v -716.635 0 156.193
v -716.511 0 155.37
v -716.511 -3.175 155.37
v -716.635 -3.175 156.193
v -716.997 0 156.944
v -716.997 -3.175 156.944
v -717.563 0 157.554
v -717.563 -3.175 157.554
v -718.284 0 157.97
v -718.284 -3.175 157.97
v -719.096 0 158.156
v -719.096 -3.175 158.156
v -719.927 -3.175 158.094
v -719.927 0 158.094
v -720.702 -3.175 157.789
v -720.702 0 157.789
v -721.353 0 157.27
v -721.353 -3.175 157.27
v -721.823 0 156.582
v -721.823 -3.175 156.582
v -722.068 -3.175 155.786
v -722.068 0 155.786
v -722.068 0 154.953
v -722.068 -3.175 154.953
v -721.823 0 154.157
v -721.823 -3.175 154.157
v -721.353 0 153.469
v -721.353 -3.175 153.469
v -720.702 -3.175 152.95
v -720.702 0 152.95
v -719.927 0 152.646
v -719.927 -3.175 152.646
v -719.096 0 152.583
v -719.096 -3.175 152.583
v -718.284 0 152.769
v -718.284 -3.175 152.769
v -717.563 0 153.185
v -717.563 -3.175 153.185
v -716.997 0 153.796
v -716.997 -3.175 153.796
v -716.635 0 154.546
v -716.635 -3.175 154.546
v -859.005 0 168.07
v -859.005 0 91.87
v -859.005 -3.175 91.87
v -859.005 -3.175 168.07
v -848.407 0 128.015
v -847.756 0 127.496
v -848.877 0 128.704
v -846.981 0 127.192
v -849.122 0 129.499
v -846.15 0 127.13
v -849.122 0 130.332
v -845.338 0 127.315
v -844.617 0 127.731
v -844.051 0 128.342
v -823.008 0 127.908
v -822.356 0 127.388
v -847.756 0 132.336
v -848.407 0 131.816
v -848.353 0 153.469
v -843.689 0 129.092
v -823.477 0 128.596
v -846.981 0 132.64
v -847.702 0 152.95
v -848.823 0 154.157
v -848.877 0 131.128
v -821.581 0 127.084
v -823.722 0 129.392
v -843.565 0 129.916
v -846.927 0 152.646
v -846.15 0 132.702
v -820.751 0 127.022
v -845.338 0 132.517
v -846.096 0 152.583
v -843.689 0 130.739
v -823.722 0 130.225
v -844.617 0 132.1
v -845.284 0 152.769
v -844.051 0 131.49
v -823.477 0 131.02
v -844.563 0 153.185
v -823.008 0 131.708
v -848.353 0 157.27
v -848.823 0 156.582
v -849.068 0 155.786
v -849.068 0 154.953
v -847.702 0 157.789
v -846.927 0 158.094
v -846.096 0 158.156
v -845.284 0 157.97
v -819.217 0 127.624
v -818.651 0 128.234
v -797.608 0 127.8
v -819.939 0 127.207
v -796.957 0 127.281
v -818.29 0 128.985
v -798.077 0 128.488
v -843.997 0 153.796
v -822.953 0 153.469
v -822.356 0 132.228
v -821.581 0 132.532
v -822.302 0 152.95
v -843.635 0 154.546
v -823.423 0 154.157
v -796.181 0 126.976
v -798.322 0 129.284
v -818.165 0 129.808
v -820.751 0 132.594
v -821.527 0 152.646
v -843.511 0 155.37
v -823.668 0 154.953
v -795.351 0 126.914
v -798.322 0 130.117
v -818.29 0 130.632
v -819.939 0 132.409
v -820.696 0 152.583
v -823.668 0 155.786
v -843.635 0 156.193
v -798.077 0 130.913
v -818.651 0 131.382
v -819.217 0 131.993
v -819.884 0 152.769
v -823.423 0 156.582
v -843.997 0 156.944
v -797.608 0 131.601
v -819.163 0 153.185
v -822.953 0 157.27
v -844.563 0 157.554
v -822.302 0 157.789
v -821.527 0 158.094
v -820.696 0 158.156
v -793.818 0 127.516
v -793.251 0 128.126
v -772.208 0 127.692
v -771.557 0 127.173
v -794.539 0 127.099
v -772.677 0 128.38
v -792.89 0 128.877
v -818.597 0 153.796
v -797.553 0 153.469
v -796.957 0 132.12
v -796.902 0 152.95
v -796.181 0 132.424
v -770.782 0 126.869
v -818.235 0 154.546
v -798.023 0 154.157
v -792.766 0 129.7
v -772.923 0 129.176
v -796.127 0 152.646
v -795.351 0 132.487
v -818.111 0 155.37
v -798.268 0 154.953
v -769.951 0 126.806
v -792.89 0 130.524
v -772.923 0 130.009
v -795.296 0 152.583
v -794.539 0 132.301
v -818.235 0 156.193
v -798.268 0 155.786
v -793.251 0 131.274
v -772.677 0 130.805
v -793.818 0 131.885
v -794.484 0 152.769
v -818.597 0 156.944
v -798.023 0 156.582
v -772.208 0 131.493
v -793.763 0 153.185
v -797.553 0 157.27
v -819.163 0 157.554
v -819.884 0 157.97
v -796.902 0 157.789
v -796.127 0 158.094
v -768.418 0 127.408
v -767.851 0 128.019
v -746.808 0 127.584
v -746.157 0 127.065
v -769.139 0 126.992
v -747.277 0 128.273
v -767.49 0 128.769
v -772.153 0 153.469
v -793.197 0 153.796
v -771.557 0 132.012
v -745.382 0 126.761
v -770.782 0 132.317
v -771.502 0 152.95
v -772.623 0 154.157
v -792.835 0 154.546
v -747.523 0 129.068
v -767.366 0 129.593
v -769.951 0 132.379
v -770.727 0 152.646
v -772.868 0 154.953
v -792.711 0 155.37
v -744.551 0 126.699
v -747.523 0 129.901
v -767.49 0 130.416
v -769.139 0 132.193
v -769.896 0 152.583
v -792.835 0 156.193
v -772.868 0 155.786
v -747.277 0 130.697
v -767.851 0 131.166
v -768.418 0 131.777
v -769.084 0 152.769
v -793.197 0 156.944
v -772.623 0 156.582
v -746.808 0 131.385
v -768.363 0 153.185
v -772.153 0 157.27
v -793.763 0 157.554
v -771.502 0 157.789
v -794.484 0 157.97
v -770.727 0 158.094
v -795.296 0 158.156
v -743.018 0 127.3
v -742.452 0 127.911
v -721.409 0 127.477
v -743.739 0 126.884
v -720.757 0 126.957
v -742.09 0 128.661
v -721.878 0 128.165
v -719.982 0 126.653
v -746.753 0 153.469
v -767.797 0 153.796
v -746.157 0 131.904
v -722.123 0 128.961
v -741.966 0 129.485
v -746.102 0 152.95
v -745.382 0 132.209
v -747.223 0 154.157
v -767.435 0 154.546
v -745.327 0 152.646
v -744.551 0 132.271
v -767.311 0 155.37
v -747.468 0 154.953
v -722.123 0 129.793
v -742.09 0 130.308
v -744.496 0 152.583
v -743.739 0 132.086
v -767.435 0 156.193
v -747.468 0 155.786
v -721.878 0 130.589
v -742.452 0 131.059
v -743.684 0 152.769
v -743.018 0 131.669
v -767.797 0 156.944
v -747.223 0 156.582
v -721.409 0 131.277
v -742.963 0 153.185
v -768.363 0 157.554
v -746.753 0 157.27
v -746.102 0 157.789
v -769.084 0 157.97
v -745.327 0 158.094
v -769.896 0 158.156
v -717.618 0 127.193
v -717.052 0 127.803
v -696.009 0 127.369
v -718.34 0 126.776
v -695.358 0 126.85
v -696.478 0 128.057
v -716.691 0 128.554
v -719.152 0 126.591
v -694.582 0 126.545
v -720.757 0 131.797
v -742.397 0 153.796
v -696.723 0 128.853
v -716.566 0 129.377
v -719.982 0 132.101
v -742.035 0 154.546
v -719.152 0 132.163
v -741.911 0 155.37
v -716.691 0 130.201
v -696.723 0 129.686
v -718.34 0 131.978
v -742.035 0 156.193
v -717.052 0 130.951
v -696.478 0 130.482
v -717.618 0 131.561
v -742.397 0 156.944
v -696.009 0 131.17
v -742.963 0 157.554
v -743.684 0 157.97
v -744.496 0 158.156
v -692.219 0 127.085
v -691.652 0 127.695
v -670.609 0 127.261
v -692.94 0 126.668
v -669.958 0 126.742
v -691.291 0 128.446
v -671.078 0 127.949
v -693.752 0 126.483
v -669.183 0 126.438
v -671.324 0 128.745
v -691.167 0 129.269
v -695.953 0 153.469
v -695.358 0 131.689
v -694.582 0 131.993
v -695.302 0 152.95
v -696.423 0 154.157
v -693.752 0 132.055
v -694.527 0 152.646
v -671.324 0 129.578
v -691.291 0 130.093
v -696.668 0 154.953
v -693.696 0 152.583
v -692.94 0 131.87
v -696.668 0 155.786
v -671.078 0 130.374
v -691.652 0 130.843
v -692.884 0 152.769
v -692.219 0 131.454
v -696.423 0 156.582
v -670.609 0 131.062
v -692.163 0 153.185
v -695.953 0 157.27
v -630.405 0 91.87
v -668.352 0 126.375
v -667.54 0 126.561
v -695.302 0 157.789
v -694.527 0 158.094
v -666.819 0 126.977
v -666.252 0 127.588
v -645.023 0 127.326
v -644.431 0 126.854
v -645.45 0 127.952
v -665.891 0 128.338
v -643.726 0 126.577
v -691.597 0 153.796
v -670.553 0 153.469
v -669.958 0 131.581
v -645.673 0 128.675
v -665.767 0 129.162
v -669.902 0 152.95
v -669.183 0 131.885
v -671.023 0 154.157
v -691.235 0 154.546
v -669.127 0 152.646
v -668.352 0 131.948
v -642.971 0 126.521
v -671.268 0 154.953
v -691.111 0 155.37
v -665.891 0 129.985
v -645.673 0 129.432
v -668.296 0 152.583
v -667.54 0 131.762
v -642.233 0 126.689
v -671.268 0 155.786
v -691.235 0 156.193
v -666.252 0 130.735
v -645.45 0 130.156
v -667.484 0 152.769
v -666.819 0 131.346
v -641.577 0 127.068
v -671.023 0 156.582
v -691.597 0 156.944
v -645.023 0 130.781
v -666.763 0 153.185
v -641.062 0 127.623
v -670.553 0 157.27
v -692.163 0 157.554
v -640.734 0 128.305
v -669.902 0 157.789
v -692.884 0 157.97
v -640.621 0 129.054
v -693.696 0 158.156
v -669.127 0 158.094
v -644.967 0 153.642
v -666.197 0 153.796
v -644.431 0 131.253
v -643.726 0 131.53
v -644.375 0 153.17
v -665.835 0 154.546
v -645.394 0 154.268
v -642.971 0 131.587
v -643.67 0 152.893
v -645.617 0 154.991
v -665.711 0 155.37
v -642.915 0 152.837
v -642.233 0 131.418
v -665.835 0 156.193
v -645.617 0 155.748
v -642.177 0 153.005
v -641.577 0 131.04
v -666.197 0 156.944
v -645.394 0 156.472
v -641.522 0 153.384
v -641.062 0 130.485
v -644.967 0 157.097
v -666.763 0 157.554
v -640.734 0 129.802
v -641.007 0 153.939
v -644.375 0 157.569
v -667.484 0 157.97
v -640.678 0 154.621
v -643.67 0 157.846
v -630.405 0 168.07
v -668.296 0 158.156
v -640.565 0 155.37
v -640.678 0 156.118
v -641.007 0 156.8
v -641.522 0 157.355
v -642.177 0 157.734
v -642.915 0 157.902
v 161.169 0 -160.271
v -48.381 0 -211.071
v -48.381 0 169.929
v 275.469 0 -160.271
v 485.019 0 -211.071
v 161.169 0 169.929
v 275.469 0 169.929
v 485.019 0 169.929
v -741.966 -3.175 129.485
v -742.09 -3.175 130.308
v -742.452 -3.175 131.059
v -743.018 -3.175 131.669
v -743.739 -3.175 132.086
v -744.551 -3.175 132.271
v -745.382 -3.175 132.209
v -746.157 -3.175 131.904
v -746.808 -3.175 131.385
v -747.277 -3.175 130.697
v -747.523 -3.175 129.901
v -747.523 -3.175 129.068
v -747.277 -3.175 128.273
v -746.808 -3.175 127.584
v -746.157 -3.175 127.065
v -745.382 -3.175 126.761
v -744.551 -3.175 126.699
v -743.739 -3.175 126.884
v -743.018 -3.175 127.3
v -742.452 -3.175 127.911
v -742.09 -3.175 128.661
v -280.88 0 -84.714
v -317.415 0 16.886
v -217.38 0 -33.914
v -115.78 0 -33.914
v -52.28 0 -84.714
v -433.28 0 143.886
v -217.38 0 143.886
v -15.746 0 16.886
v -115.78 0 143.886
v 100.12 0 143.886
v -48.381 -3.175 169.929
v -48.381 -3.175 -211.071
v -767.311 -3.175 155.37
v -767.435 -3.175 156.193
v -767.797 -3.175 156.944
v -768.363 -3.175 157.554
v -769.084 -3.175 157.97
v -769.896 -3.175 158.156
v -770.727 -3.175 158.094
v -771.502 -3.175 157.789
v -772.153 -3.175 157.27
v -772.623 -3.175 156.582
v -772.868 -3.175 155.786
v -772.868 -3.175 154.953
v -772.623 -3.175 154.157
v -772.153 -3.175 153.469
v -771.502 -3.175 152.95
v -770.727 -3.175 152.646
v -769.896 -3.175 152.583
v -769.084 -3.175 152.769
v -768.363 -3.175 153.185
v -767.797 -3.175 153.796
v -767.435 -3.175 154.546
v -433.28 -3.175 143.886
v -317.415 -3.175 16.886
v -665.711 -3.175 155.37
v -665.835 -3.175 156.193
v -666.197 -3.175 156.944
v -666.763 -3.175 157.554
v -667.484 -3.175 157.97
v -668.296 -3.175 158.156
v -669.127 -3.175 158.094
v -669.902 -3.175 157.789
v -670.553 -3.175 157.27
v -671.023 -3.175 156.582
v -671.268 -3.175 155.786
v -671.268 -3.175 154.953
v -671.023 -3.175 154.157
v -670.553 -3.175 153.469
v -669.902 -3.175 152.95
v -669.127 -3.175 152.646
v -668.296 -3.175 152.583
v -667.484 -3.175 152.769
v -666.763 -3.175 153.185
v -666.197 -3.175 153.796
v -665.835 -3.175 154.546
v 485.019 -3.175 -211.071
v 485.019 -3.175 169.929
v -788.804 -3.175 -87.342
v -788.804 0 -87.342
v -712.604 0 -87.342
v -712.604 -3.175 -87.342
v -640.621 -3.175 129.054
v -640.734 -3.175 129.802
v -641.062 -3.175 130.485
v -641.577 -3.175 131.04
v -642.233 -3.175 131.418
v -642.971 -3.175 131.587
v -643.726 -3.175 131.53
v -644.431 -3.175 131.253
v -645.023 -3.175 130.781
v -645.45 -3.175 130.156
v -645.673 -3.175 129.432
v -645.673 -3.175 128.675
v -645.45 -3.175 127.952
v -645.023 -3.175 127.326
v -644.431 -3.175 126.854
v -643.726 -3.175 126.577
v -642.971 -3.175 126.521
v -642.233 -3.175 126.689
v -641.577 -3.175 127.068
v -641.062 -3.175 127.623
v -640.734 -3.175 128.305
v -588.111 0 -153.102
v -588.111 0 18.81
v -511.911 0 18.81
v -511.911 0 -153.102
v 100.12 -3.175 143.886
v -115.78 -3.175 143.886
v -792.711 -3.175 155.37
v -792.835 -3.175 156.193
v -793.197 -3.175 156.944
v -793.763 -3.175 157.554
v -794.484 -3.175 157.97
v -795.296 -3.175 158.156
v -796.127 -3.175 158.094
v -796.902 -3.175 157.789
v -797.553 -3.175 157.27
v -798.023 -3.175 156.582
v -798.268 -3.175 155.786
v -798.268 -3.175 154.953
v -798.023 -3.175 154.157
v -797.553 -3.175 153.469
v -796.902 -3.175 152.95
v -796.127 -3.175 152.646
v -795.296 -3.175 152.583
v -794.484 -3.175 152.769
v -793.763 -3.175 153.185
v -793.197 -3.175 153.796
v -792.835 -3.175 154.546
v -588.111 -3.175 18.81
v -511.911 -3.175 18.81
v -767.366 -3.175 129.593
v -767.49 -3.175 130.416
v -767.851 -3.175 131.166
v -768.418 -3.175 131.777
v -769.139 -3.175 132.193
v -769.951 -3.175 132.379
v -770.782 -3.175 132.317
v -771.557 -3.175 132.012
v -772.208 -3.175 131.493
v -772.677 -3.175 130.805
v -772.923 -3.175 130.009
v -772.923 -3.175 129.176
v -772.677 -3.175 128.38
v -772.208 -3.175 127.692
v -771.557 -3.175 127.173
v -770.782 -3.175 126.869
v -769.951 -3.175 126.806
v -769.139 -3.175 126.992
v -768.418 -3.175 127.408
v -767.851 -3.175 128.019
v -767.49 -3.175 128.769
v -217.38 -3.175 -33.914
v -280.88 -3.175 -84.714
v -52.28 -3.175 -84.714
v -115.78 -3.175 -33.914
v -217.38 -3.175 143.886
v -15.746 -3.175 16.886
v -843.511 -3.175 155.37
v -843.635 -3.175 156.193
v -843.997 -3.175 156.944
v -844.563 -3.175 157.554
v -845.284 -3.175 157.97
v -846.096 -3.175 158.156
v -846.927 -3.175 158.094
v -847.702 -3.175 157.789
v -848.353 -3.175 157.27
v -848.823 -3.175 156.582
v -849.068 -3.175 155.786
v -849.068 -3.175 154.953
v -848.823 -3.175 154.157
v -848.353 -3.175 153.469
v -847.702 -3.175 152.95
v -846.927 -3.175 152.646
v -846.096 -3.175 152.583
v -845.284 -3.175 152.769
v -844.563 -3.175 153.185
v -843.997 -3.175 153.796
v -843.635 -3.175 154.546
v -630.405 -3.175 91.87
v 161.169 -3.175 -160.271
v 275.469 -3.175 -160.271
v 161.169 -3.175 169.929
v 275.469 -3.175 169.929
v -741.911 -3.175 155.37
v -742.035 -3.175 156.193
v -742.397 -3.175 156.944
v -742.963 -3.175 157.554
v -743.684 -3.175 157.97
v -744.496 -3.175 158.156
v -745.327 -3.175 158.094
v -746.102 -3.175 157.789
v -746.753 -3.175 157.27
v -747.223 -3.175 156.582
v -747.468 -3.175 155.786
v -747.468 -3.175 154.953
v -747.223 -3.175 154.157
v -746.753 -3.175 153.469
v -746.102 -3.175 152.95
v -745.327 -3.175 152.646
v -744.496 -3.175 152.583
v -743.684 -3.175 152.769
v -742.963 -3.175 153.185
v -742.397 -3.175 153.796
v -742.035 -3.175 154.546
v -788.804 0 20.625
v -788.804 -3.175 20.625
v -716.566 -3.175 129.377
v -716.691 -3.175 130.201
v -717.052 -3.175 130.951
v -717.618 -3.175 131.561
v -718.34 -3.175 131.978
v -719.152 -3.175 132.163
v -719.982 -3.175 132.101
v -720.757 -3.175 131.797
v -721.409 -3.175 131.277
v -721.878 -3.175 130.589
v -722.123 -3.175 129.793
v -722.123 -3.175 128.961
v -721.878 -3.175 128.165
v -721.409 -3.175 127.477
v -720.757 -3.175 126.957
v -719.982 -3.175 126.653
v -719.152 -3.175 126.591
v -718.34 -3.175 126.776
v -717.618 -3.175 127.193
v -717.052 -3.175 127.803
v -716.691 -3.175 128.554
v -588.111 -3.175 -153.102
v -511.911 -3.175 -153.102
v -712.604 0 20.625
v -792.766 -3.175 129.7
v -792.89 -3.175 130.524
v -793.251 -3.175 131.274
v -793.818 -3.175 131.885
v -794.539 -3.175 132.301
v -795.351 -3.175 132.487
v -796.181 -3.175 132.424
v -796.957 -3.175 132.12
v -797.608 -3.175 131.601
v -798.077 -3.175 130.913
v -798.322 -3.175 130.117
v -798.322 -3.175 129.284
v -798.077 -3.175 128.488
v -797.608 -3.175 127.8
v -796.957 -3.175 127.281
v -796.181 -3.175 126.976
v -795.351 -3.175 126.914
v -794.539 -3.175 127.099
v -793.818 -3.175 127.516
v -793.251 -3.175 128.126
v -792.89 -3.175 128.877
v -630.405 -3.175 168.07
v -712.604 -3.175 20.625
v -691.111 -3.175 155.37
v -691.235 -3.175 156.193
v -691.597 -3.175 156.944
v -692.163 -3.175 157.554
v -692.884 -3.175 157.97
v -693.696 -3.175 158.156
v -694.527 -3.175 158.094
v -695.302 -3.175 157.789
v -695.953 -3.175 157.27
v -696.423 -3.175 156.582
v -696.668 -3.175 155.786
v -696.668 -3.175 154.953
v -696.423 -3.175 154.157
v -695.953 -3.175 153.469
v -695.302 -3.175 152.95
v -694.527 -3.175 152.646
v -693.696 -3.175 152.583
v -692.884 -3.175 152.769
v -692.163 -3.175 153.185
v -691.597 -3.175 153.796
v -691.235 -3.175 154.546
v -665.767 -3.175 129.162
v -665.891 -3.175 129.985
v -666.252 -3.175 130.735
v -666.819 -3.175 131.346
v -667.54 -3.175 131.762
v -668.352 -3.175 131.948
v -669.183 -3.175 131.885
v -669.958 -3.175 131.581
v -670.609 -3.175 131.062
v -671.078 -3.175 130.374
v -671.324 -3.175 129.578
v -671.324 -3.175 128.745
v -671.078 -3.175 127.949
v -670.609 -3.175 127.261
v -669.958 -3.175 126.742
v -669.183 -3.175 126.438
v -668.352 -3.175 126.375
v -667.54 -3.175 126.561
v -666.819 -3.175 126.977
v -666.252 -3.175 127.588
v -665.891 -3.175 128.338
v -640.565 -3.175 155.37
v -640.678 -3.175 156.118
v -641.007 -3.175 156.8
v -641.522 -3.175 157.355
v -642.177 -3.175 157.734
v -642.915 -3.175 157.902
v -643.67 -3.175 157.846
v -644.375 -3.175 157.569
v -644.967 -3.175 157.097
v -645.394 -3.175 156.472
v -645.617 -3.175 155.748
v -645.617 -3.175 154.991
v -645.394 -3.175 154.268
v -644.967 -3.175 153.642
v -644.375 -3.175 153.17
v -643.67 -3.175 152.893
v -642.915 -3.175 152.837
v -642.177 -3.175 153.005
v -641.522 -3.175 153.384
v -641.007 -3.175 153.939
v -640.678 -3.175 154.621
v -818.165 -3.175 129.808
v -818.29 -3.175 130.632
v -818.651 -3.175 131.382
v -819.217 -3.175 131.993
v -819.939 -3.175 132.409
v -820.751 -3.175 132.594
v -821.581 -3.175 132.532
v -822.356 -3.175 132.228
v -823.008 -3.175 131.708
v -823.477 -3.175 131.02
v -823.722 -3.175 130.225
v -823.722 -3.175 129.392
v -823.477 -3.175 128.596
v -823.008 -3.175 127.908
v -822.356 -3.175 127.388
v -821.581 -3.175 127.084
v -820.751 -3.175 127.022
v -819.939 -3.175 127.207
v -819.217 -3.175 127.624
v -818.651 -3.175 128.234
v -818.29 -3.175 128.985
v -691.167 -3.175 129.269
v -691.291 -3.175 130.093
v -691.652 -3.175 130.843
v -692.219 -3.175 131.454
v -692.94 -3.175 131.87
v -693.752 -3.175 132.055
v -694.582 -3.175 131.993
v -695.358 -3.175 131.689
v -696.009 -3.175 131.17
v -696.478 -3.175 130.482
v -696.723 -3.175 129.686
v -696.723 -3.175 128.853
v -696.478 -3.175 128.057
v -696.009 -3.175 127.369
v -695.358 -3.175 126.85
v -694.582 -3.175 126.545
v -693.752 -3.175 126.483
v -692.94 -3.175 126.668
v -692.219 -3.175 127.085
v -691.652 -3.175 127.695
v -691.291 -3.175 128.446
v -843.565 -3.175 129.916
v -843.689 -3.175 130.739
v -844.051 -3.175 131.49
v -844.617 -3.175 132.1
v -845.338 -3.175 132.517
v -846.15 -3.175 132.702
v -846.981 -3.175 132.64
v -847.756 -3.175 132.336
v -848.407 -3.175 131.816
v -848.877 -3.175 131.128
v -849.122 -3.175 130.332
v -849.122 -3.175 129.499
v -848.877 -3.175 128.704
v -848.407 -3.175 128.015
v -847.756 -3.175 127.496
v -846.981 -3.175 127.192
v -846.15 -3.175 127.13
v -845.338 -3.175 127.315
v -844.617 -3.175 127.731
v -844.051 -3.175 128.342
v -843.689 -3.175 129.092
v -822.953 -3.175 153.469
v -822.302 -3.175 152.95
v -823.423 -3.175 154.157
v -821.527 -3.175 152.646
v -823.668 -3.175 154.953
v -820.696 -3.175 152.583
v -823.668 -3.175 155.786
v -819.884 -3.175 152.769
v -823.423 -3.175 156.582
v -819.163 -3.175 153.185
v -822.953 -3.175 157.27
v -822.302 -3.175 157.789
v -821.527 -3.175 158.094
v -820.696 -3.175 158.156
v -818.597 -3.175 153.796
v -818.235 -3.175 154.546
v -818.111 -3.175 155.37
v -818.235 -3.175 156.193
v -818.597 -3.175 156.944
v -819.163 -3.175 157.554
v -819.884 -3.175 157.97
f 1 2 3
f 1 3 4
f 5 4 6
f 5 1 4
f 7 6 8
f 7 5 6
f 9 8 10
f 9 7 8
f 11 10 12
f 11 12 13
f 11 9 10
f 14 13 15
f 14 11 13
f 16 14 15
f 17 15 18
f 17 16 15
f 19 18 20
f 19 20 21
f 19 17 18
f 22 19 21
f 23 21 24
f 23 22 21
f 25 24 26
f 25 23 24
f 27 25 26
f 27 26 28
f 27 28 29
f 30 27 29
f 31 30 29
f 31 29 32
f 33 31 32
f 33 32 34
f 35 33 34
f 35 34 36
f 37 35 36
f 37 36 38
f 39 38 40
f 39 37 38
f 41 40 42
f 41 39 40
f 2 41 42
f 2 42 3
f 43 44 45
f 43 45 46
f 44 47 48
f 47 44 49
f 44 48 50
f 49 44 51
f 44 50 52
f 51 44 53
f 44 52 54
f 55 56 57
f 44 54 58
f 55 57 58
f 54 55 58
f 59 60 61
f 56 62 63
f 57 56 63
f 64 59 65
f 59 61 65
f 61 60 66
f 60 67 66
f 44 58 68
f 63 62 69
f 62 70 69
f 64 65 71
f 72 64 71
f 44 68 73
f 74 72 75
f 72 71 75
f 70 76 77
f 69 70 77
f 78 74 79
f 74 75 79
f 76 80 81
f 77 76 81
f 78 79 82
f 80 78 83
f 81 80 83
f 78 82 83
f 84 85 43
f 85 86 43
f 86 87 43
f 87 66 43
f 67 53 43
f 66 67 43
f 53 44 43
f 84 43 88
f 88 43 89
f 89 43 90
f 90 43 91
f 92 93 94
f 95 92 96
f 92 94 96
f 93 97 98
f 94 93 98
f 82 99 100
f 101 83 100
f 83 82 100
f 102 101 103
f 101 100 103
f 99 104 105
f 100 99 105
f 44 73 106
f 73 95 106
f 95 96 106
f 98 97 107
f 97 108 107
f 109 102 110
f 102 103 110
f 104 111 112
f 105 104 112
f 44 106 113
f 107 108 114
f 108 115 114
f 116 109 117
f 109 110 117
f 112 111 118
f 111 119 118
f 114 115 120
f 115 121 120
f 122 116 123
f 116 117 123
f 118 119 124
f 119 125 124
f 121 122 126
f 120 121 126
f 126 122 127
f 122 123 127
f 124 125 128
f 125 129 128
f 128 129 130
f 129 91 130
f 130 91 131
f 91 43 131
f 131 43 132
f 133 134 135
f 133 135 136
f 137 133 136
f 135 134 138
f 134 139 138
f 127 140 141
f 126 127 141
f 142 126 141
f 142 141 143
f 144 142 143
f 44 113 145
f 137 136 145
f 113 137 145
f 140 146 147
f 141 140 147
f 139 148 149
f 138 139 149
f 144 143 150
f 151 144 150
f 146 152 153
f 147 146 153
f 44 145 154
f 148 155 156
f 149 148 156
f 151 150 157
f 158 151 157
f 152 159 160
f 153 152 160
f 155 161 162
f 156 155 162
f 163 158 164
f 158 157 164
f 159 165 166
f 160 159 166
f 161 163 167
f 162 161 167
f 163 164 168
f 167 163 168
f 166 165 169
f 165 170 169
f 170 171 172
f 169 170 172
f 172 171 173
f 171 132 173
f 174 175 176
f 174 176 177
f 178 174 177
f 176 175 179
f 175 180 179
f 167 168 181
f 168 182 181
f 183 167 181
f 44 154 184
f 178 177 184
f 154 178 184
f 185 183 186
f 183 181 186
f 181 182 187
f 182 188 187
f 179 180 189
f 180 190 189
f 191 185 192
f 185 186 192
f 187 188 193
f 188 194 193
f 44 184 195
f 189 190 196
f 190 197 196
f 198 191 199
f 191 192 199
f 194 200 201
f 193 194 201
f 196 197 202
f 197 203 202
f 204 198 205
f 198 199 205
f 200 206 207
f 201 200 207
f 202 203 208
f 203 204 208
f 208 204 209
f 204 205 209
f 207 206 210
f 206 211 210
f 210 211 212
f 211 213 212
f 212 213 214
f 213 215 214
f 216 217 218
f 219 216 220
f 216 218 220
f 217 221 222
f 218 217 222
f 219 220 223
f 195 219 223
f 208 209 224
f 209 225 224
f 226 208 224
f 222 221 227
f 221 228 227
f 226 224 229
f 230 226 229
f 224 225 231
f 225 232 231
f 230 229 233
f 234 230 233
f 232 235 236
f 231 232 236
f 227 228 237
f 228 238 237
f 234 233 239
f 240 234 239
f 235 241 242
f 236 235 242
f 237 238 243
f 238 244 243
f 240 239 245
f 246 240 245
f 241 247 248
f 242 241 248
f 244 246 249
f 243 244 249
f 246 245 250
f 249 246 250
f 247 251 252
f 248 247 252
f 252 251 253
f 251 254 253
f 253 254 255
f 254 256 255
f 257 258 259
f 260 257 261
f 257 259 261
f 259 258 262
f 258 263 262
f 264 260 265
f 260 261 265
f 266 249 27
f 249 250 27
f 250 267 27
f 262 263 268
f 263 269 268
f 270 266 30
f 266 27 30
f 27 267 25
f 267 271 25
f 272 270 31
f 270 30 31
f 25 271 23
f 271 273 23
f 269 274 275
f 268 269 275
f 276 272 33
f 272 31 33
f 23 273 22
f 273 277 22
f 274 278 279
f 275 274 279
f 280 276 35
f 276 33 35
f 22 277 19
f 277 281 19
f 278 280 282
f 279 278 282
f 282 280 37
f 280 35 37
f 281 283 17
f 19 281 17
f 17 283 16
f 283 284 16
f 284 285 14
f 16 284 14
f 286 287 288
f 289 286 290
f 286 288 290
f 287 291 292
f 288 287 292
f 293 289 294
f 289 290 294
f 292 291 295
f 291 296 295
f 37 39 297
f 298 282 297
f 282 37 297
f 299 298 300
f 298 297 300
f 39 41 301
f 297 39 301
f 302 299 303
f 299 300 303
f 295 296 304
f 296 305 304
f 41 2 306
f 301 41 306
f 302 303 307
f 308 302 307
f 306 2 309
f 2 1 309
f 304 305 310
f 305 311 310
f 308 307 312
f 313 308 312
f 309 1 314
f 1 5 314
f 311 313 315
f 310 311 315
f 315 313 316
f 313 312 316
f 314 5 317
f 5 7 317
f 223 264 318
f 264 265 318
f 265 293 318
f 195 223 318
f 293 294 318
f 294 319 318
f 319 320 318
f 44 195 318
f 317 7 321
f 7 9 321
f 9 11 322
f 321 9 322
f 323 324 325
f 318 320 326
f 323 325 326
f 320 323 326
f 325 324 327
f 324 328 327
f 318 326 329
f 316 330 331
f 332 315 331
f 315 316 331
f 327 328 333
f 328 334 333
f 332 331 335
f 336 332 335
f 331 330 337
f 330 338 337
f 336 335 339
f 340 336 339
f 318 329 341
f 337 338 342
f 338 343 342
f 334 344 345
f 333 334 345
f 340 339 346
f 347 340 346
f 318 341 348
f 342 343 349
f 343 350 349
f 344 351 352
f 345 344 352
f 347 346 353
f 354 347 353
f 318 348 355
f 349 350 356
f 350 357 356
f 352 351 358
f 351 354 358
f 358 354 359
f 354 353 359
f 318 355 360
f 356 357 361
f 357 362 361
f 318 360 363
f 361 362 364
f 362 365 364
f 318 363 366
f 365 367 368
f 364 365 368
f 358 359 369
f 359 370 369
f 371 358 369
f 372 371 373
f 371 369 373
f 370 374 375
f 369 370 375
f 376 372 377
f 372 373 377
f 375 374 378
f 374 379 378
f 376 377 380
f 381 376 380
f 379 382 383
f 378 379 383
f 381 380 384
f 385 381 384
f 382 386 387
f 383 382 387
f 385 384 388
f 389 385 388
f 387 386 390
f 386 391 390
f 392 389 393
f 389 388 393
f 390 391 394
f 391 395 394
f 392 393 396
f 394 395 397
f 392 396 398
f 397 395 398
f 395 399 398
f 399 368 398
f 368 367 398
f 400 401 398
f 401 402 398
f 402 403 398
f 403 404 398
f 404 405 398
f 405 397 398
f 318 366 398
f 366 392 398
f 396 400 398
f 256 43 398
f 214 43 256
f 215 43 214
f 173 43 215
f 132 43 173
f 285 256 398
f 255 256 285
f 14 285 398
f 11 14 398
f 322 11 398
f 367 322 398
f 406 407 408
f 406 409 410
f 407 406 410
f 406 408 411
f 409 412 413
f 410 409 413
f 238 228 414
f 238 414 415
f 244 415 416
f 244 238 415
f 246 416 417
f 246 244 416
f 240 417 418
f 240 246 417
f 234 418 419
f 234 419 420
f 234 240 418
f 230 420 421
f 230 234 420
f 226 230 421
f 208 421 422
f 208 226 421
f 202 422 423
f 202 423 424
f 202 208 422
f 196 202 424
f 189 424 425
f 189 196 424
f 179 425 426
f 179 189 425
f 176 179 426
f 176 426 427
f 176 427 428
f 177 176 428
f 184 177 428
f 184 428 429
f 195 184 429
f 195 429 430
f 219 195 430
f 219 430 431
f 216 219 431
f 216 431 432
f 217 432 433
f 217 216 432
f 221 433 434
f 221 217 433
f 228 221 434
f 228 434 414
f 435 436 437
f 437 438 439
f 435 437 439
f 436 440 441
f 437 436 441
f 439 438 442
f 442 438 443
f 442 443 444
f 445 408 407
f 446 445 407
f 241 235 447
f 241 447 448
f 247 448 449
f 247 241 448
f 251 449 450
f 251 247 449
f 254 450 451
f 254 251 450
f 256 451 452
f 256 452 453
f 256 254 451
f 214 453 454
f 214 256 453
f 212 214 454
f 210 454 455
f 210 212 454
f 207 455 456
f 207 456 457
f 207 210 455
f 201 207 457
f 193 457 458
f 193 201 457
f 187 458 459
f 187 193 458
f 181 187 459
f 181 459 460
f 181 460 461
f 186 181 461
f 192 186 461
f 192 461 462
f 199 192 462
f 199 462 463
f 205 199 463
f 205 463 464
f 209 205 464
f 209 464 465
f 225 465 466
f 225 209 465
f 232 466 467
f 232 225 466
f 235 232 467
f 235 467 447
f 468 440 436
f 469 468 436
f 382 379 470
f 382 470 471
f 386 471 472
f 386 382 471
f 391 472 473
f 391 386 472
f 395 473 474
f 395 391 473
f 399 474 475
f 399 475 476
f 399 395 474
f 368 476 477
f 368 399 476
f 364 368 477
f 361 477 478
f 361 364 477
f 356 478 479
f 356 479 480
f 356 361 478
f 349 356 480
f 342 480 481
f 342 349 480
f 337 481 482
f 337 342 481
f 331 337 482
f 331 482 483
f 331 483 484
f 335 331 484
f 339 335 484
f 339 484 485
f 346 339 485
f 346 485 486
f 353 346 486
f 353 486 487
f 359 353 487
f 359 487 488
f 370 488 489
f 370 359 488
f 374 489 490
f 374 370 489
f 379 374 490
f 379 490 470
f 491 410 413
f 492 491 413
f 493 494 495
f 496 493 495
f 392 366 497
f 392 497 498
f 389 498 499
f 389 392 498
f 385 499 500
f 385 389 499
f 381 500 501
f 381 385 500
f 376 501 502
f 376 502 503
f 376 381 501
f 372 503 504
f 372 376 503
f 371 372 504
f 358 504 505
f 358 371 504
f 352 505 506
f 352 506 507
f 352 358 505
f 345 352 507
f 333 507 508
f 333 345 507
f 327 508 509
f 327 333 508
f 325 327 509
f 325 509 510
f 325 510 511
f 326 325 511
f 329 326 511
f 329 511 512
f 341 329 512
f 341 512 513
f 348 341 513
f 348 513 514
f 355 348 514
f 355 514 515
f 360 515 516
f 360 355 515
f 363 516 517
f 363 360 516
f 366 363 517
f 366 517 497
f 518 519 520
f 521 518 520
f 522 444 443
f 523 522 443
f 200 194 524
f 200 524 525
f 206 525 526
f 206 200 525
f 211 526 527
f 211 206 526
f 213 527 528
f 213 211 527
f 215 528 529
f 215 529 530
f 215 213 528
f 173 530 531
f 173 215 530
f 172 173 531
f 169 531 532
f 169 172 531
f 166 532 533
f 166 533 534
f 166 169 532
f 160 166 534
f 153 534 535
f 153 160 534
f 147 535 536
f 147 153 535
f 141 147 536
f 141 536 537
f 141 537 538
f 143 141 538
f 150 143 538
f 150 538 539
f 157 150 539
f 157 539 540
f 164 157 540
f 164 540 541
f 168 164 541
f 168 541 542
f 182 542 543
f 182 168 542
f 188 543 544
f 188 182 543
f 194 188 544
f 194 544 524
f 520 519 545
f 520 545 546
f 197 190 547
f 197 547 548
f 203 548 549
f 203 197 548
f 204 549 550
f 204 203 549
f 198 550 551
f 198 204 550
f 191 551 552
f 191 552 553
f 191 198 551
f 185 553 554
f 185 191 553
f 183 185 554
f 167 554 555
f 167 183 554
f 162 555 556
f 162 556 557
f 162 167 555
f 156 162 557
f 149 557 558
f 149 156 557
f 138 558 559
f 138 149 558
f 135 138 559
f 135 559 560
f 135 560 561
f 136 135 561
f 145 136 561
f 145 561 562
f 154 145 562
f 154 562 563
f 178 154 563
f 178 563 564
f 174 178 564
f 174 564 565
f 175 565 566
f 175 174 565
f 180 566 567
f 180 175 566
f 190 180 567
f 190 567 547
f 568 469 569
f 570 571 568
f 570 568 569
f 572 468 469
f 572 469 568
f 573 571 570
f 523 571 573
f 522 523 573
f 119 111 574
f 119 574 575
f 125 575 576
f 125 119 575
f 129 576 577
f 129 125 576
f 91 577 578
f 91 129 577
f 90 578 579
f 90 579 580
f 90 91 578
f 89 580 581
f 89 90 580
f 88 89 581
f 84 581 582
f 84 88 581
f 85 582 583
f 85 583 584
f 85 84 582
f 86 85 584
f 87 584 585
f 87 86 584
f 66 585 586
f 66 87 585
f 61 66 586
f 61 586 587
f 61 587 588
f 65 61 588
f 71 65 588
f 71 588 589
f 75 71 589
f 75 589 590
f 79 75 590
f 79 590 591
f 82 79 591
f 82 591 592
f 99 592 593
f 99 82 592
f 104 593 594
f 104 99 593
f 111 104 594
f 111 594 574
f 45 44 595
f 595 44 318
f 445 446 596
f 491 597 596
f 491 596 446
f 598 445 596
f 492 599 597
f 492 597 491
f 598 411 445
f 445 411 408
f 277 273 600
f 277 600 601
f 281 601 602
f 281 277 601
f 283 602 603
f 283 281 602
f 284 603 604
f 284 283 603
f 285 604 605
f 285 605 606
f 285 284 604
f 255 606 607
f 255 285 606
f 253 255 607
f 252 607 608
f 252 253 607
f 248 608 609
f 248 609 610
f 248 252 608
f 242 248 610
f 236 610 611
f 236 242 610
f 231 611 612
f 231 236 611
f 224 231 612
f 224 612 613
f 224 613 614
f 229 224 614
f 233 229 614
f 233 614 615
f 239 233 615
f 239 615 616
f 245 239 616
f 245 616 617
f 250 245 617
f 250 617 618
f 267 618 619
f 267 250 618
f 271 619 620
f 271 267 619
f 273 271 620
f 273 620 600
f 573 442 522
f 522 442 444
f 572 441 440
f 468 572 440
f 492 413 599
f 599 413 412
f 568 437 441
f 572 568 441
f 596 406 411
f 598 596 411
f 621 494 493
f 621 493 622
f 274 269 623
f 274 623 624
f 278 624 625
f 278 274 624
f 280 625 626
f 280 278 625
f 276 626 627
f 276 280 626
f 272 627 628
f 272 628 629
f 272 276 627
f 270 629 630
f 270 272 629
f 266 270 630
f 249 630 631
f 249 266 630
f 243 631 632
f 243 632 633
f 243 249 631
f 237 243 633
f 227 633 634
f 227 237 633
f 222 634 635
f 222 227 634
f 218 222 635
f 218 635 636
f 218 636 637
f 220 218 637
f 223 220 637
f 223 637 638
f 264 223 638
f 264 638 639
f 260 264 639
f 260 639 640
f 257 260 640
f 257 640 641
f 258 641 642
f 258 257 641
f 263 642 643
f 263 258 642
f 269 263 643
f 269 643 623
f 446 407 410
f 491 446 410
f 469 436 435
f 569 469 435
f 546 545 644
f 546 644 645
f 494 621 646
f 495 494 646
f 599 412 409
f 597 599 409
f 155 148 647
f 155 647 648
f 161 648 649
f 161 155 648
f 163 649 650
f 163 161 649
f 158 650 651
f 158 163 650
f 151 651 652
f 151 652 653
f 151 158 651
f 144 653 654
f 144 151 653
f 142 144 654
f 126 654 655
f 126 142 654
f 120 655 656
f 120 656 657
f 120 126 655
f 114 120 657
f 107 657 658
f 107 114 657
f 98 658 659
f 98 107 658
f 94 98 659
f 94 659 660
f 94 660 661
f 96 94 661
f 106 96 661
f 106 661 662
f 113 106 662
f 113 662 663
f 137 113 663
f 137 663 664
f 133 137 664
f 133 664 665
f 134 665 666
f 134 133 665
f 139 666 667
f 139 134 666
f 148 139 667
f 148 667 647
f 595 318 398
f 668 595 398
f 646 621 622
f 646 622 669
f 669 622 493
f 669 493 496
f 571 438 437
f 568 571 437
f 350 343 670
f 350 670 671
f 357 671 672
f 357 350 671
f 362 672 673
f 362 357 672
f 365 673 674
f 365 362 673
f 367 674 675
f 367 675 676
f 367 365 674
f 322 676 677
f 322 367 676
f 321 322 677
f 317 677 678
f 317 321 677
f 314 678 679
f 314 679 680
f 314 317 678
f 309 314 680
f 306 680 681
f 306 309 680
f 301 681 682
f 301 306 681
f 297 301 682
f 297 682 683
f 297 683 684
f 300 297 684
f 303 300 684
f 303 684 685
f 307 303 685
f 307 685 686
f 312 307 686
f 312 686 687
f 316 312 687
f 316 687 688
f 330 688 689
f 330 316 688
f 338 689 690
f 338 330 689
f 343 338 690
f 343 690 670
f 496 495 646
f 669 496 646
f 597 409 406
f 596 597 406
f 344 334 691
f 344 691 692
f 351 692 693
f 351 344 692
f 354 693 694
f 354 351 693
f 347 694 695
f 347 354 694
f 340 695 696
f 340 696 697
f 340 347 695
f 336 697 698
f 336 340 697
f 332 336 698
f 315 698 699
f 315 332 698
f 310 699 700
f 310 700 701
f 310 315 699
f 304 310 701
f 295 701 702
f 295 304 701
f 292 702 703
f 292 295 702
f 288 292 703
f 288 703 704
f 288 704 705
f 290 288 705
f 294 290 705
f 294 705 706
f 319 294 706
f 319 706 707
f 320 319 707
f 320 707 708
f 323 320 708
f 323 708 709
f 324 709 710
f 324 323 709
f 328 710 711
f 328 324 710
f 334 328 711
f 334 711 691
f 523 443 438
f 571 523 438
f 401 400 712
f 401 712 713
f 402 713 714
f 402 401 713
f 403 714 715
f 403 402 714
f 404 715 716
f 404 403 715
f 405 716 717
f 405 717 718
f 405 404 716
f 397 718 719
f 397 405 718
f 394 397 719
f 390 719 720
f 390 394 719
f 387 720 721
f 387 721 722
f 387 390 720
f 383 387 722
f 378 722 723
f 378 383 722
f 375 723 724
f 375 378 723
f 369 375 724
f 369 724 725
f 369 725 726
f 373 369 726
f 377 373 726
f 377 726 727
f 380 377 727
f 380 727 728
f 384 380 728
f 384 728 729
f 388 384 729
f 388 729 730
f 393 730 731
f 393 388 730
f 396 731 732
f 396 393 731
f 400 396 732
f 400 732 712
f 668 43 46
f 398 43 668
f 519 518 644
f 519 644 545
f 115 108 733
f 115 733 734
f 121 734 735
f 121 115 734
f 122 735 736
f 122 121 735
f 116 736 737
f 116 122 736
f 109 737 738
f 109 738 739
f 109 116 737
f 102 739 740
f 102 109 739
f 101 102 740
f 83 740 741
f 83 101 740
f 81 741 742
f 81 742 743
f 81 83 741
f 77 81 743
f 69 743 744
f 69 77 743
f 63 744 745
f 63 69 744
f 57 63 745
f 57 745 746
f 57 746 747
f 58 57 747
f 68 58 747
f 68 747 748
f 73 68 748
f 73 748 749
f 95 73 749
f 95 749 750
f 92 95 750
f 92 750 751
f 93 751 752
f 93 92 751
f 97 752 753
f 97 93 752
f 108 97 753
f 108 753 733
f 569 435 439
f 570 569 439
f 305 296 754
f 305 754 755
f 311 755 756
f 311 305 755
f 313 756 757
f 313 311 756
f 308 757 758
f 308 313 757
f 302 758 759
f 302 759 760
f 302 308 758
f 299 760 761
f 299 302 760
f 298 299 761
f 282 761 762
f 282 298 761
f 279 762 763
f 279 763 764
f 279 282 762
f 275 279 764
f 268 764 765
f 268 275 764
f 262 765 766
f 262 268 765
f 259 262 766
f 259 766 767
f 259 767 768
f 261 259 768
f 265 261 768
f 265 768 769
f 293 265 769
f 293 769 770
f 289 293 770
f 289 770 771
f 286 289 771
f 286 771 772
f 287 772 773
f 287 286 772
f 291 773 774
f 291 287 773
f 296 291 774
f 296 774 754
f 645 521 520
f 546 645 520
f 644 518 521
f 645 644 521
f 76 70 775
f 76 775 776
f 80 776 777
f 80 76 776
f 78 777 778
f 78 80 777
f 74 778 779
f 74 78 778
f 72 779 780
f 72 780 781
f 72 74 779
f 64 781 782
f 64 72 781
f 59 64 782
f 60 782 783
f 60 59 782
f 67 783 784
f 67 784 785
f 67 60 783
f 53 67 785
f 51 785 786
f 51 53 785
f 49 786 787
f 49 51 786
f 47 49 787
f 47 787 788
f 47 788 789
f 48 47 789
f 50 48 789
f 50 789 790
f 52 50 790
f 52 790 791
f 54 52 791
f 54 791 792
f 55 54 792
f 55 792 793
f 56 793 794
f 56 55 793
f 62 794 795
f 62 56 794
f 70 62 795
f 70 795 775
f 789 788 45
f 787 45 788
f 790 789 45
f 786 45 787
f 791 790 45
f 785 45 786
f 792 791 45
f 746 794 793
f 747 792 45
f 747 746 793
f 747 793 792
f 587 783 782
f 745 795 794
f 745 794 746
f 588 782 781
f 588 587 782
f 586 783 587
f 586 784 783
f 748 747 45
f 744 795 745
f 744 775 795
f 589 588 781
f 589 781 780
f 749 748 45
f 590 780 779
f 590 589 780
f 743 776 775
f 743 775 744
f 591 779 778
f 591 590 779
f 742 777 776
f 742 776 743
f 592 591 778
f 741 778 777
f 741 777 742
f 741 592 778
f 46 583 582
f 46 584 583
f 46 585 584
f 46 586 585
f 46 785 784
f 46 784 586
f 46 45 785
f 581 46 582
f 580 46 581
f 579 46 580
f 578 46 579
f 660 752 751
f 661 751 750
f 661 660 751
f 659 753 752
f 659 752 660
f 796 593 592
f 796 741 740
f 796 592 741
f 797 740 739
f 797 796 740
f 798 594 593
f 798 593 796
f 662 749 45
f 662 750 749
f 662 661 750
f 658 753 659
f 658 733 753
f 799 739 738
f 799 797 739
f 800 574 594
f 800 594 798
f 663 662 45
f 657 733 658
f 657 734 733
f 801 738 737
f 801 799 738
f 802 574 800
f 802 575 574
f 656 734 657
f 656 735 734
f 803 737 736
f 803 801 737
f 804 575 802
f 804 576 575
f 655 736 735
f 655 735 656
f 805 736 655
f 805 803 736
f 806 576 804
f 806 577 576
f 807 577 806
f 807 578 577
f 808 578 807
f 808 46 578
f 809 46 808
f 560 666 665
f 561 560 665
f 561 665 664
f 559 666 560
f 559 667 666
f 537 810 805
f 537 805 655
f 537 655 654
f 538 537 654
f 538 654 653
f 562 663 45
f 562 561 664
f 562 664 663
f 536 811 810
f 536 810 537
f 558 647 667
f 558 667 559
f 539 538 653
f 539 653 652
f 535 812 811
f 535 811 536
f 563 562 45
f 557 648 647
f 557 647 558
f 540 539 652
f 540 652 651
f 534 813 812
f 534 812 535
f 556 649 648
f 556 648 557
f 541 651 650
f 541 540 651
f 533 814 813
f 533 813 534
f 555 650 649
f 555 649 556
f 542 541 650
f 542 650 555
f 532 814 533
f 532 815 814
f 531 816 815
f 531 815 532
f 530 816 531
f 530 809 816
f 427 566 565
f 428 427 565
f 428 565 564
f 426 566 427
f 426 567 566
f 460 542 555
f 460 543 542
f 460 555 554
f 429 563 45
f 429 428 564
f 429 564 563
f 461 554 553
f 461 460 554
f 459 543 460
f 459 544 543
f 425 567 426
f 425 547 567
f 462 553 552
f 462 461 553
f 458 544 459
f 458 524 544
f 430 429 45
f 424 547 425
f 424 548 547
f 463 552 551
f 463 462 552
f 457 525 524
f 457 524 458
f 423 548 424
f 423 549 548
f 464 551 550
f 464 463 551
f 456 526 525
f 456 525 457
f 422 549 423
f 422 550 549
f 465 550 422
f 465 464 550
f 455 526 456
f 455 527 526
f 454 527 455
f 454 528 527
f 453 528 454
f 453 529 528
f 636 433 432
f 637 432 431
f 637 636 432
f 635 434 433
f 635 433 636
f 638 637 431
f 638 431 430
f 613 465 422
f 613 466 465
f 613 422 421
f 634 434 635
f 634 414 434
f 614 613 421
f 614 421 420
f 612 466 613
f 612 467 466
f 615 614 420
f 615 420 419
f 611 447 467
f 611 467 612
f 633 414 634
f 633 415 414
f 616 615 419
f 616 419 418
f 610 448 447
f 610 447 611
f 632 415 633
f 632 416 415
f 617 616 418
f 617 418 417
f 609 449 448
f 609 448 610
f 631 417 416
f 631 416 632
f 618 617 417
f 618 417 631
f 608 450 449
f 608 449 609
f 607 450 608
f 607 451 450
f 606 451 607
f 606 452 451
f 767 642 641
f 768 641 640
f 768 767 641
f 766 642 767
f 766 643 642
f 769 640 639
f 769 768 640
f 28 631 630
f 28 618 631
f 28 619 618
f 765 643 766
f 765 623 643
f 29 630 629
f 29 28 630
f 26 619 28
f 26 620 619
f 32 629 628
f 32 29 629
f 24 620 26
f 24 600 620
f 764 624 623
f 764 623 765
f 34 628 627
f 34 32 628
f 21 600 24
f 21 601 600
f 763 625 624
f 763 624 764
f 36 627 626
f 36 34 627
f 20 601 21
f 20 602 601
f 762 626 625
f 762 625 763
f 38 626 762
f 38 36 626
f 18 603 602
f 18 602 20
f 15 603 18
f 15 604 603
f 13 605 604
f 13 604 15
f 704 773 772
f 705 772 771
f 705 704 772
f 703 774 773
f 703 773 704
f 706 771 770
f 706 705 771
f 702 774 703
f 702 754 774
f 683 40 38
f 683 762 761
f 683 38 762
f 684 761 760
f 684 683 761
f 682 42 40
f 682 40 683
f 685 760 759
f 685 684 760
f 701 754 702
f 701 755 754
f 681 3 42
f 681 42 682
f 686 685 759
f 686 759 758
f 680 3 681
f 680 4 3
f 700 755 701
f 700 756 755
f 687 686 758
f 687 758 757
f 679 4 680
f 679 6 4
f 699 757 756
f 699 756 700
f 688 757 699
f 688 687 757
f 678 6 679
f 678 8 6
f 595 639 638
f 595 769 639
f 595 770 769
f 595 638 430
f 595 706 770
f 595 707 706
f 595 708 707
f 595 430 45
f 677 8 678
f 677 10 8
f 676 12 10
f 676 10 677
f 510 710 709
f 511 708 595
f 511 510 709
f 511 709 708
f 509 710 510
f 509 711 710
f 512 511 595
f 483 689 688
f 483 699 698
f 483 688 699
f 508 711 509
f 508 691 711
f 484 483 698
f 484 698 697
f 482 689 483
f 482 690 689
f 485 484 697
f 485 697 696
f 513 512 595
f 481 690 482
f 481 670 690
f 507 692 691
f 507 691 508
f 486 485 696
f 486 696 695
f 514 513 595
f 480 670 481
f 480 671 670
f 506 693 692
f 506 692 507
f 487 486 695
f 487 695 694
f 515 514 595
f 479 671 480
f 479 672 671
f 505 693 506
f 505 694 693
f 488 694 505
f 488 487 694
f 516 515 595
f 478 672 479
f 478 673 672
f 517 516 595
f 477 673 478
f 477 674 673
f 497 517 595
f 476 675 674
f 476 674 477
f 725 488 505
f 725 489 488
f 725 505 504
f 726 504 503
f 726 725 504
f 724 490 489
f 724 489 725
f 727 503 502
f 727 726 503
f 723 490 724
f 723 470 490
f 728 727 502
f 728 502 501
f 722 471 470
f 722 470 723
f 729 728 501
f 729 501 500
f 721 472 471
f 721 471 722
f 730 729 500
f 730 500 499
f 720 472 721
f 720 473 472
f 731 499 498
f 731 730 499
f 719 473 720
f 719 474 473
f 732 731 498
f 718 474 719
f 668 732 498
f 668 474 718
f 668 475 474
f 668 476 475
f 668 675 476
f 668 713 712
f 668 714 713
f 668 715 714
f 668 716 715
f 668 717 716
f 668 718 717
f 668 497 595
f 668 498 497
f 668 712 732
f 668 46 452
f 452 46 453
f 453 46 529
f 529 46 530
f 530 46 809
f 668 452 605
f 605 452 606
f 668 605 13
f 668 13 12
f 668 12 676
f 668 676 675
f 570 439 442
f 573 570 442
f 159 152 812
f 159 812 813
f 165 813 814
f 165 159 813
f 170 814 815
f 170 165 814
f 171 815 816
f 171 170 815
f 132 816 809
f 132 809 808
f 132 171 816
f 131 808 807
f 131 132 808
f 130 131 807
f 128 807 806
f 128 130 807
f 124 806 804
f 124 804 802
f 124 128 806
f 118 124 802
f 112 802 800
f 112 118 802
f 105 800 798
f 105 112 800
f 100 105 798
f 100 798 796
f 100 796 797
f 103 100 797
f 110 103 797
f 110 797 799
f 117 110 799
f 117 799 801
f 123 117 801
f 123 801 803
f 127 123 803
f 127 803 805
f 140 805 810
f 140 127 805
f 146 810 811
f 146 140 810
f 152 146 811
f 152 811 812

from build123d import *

# Parameters (mm, degrees)
F1_DEPTH = 3.175
F4_W     = 76.2
F4_H     = 107.96778
F6_DEPTH = 3.175
F5_W     = 76.2
F5_H     = 171.91228
F7_DEPTH = 3.175
F3_W     = 228.6
F3_H     = 76.2
F3_R     = 2.794
F3_R_2   = 2.54
F8_DEPTH = 3.175
F9_DEPTH = 3.175


# Not quite as in the source:
# - a length typed as a fraction of an inch, garbled in the dataset ("3 / 203.2 mm" for 3/8 in), is restored


with BuildPart() as f1:
    # F0 (on Front) → F1 (new body)
    with BuildSketch(Plane.XZ):
        Polygon((-217.3804237127, 143.8863651395), (-433.2804237127, 143.8863651395), (-317.4146833124, 16.8863651395), (-280.8804237127, -84.7136348605), (-52.2804237127, -84.7136348605), (-15.7461641131, 16.8863651395), (100.1195762873, 143.8863651395), (-115.7804237127, 143.8863651395), (-115.7804237127, -33.9136348605), (-217.3804237127, -33.9136348605), align=None)
    extrude(amount=F1_DEPTH)


with BuildPart() as f6:
    # F4 (on Front) → F6 (new body)
    with BuildSketch(Plane.XZ):
        with Locations((-750.7039308548, -33.3585813642)):
            Rectangle(F4_W, F4_H)
    extrude(amount=F6_DEPTH)


with BuildPart() as f7:
    # F5 (on Front) → F7 (new body)
    with BuildSketch(Plane.XZ):
        with Locations((-550.0105619431, -67.1462193131)):
            Rectangle(F5_W, F5_H)
    extrude(amount=F7_DEPTH)


with BuildPart() as f8:
    # F3 (on Front) → F8 (new body)
    with BuildSketch(Plane.XZ):
        with Locations((-744.705254101, 129.9696020692)):
            Rectangle(F3_W, F3_H)
        with Locations((-846.3592469164, 129.9158378293)):
            Circle(F3_R, mode=Mode.SUBTRACT)
        with Locations((-820.9594754919, 129.808080774)):
            Circle(F3_R, mode=Mode.SUBTRACT)
        with Locations((-795.5597040674, 129.7003237186)):
            Circle(F3_R, mode=Mode.SUBTRACT)
        with Locations((-770.1599326429, 129.5925666632)):
            Circle(F3_R, mode=Mode.SUBTRACT)
        with Locations((-744.7601612184, 129.4848096079)):
            Circle(F3_R, mode=Mode.SUBTRACT)
        with Locations((-719.3603897939, 129.3770525525)):
            Circle(F3_R, mode=Mode.SUBTRACT)
        with Locations((-693.9606183694, 129.2692954972)):
            Circle(F3_R, mode=Mode.SUBTRACT)
        with Locations((-668.5608469449, 129.1615384418)):
            Circle(F3_R, mode=Mode.SUBTRACT)
        with Locations((-643.1610755204, 129.0537813865)):
            Circle(F3_R_2, mode=Mode.SUBTRACT)
        with Locations((-846.305254101, 155.3696020692)):
            Circle(F3_R, mode=Mode.SUBTRACT)
        with Locations((-820.905254101, 155.3696020692)):
            Circle(F3_R, mode=Mode.SUBTRACT)
        with Locations((-795.505254101, 155.3696020692)):
            Circle(F3_R, mode=Mode.SUBTRACT)
        with Locations((-770.105254101, 155.3696020692)):
            Circle(F3_R, mode=Mode.SUBTRACT)
        with Locations((-744.705254101, 155.3696020692)):
            Circle(F3_R, mode=Mode.SUBTRACT)
        with Locations((-719.305254101, 155.3696020692)):
            Circle(F3_R, mode=Mode.SUBTRACT)
        with Locations((-693.905254101, 155.3696020692)):
            Circle(F3_R, mode=Mode.SUBTRACT)
        with Locations((-668.505254101, 155.3696020692)):
            Circle(F3_R, mode=Mode.SUBTRACT)
        with Locations((-643.105254101, 155.3696020692)):
            Circle(F3_R_2, mode=Mode.SUBTRACT)
    extrude(amount=F8_DEPTH)


with BuildPart() as f9:
    # F2 (on Front) → F9 (new body)
    with BuildSketch(Plane.XZ):
        Polygon((161.1693713427, 169.9292318031), (-48.3806286573, 169.9292318031), (-48.3806286573, -211.0707681969), (485.0193713427, -211.0707681969), (485.0193713427, 169.9292318031), (275.4693713427, 169.9292318031), (275.4693713427, -160.2707681969), (161.1693713427, -160.2707681969), align=None)
    extrude(amount=F9_DEPTH)


solid = Compound([f1.part, f6.part, f7.part, f8.part, f9.part])
